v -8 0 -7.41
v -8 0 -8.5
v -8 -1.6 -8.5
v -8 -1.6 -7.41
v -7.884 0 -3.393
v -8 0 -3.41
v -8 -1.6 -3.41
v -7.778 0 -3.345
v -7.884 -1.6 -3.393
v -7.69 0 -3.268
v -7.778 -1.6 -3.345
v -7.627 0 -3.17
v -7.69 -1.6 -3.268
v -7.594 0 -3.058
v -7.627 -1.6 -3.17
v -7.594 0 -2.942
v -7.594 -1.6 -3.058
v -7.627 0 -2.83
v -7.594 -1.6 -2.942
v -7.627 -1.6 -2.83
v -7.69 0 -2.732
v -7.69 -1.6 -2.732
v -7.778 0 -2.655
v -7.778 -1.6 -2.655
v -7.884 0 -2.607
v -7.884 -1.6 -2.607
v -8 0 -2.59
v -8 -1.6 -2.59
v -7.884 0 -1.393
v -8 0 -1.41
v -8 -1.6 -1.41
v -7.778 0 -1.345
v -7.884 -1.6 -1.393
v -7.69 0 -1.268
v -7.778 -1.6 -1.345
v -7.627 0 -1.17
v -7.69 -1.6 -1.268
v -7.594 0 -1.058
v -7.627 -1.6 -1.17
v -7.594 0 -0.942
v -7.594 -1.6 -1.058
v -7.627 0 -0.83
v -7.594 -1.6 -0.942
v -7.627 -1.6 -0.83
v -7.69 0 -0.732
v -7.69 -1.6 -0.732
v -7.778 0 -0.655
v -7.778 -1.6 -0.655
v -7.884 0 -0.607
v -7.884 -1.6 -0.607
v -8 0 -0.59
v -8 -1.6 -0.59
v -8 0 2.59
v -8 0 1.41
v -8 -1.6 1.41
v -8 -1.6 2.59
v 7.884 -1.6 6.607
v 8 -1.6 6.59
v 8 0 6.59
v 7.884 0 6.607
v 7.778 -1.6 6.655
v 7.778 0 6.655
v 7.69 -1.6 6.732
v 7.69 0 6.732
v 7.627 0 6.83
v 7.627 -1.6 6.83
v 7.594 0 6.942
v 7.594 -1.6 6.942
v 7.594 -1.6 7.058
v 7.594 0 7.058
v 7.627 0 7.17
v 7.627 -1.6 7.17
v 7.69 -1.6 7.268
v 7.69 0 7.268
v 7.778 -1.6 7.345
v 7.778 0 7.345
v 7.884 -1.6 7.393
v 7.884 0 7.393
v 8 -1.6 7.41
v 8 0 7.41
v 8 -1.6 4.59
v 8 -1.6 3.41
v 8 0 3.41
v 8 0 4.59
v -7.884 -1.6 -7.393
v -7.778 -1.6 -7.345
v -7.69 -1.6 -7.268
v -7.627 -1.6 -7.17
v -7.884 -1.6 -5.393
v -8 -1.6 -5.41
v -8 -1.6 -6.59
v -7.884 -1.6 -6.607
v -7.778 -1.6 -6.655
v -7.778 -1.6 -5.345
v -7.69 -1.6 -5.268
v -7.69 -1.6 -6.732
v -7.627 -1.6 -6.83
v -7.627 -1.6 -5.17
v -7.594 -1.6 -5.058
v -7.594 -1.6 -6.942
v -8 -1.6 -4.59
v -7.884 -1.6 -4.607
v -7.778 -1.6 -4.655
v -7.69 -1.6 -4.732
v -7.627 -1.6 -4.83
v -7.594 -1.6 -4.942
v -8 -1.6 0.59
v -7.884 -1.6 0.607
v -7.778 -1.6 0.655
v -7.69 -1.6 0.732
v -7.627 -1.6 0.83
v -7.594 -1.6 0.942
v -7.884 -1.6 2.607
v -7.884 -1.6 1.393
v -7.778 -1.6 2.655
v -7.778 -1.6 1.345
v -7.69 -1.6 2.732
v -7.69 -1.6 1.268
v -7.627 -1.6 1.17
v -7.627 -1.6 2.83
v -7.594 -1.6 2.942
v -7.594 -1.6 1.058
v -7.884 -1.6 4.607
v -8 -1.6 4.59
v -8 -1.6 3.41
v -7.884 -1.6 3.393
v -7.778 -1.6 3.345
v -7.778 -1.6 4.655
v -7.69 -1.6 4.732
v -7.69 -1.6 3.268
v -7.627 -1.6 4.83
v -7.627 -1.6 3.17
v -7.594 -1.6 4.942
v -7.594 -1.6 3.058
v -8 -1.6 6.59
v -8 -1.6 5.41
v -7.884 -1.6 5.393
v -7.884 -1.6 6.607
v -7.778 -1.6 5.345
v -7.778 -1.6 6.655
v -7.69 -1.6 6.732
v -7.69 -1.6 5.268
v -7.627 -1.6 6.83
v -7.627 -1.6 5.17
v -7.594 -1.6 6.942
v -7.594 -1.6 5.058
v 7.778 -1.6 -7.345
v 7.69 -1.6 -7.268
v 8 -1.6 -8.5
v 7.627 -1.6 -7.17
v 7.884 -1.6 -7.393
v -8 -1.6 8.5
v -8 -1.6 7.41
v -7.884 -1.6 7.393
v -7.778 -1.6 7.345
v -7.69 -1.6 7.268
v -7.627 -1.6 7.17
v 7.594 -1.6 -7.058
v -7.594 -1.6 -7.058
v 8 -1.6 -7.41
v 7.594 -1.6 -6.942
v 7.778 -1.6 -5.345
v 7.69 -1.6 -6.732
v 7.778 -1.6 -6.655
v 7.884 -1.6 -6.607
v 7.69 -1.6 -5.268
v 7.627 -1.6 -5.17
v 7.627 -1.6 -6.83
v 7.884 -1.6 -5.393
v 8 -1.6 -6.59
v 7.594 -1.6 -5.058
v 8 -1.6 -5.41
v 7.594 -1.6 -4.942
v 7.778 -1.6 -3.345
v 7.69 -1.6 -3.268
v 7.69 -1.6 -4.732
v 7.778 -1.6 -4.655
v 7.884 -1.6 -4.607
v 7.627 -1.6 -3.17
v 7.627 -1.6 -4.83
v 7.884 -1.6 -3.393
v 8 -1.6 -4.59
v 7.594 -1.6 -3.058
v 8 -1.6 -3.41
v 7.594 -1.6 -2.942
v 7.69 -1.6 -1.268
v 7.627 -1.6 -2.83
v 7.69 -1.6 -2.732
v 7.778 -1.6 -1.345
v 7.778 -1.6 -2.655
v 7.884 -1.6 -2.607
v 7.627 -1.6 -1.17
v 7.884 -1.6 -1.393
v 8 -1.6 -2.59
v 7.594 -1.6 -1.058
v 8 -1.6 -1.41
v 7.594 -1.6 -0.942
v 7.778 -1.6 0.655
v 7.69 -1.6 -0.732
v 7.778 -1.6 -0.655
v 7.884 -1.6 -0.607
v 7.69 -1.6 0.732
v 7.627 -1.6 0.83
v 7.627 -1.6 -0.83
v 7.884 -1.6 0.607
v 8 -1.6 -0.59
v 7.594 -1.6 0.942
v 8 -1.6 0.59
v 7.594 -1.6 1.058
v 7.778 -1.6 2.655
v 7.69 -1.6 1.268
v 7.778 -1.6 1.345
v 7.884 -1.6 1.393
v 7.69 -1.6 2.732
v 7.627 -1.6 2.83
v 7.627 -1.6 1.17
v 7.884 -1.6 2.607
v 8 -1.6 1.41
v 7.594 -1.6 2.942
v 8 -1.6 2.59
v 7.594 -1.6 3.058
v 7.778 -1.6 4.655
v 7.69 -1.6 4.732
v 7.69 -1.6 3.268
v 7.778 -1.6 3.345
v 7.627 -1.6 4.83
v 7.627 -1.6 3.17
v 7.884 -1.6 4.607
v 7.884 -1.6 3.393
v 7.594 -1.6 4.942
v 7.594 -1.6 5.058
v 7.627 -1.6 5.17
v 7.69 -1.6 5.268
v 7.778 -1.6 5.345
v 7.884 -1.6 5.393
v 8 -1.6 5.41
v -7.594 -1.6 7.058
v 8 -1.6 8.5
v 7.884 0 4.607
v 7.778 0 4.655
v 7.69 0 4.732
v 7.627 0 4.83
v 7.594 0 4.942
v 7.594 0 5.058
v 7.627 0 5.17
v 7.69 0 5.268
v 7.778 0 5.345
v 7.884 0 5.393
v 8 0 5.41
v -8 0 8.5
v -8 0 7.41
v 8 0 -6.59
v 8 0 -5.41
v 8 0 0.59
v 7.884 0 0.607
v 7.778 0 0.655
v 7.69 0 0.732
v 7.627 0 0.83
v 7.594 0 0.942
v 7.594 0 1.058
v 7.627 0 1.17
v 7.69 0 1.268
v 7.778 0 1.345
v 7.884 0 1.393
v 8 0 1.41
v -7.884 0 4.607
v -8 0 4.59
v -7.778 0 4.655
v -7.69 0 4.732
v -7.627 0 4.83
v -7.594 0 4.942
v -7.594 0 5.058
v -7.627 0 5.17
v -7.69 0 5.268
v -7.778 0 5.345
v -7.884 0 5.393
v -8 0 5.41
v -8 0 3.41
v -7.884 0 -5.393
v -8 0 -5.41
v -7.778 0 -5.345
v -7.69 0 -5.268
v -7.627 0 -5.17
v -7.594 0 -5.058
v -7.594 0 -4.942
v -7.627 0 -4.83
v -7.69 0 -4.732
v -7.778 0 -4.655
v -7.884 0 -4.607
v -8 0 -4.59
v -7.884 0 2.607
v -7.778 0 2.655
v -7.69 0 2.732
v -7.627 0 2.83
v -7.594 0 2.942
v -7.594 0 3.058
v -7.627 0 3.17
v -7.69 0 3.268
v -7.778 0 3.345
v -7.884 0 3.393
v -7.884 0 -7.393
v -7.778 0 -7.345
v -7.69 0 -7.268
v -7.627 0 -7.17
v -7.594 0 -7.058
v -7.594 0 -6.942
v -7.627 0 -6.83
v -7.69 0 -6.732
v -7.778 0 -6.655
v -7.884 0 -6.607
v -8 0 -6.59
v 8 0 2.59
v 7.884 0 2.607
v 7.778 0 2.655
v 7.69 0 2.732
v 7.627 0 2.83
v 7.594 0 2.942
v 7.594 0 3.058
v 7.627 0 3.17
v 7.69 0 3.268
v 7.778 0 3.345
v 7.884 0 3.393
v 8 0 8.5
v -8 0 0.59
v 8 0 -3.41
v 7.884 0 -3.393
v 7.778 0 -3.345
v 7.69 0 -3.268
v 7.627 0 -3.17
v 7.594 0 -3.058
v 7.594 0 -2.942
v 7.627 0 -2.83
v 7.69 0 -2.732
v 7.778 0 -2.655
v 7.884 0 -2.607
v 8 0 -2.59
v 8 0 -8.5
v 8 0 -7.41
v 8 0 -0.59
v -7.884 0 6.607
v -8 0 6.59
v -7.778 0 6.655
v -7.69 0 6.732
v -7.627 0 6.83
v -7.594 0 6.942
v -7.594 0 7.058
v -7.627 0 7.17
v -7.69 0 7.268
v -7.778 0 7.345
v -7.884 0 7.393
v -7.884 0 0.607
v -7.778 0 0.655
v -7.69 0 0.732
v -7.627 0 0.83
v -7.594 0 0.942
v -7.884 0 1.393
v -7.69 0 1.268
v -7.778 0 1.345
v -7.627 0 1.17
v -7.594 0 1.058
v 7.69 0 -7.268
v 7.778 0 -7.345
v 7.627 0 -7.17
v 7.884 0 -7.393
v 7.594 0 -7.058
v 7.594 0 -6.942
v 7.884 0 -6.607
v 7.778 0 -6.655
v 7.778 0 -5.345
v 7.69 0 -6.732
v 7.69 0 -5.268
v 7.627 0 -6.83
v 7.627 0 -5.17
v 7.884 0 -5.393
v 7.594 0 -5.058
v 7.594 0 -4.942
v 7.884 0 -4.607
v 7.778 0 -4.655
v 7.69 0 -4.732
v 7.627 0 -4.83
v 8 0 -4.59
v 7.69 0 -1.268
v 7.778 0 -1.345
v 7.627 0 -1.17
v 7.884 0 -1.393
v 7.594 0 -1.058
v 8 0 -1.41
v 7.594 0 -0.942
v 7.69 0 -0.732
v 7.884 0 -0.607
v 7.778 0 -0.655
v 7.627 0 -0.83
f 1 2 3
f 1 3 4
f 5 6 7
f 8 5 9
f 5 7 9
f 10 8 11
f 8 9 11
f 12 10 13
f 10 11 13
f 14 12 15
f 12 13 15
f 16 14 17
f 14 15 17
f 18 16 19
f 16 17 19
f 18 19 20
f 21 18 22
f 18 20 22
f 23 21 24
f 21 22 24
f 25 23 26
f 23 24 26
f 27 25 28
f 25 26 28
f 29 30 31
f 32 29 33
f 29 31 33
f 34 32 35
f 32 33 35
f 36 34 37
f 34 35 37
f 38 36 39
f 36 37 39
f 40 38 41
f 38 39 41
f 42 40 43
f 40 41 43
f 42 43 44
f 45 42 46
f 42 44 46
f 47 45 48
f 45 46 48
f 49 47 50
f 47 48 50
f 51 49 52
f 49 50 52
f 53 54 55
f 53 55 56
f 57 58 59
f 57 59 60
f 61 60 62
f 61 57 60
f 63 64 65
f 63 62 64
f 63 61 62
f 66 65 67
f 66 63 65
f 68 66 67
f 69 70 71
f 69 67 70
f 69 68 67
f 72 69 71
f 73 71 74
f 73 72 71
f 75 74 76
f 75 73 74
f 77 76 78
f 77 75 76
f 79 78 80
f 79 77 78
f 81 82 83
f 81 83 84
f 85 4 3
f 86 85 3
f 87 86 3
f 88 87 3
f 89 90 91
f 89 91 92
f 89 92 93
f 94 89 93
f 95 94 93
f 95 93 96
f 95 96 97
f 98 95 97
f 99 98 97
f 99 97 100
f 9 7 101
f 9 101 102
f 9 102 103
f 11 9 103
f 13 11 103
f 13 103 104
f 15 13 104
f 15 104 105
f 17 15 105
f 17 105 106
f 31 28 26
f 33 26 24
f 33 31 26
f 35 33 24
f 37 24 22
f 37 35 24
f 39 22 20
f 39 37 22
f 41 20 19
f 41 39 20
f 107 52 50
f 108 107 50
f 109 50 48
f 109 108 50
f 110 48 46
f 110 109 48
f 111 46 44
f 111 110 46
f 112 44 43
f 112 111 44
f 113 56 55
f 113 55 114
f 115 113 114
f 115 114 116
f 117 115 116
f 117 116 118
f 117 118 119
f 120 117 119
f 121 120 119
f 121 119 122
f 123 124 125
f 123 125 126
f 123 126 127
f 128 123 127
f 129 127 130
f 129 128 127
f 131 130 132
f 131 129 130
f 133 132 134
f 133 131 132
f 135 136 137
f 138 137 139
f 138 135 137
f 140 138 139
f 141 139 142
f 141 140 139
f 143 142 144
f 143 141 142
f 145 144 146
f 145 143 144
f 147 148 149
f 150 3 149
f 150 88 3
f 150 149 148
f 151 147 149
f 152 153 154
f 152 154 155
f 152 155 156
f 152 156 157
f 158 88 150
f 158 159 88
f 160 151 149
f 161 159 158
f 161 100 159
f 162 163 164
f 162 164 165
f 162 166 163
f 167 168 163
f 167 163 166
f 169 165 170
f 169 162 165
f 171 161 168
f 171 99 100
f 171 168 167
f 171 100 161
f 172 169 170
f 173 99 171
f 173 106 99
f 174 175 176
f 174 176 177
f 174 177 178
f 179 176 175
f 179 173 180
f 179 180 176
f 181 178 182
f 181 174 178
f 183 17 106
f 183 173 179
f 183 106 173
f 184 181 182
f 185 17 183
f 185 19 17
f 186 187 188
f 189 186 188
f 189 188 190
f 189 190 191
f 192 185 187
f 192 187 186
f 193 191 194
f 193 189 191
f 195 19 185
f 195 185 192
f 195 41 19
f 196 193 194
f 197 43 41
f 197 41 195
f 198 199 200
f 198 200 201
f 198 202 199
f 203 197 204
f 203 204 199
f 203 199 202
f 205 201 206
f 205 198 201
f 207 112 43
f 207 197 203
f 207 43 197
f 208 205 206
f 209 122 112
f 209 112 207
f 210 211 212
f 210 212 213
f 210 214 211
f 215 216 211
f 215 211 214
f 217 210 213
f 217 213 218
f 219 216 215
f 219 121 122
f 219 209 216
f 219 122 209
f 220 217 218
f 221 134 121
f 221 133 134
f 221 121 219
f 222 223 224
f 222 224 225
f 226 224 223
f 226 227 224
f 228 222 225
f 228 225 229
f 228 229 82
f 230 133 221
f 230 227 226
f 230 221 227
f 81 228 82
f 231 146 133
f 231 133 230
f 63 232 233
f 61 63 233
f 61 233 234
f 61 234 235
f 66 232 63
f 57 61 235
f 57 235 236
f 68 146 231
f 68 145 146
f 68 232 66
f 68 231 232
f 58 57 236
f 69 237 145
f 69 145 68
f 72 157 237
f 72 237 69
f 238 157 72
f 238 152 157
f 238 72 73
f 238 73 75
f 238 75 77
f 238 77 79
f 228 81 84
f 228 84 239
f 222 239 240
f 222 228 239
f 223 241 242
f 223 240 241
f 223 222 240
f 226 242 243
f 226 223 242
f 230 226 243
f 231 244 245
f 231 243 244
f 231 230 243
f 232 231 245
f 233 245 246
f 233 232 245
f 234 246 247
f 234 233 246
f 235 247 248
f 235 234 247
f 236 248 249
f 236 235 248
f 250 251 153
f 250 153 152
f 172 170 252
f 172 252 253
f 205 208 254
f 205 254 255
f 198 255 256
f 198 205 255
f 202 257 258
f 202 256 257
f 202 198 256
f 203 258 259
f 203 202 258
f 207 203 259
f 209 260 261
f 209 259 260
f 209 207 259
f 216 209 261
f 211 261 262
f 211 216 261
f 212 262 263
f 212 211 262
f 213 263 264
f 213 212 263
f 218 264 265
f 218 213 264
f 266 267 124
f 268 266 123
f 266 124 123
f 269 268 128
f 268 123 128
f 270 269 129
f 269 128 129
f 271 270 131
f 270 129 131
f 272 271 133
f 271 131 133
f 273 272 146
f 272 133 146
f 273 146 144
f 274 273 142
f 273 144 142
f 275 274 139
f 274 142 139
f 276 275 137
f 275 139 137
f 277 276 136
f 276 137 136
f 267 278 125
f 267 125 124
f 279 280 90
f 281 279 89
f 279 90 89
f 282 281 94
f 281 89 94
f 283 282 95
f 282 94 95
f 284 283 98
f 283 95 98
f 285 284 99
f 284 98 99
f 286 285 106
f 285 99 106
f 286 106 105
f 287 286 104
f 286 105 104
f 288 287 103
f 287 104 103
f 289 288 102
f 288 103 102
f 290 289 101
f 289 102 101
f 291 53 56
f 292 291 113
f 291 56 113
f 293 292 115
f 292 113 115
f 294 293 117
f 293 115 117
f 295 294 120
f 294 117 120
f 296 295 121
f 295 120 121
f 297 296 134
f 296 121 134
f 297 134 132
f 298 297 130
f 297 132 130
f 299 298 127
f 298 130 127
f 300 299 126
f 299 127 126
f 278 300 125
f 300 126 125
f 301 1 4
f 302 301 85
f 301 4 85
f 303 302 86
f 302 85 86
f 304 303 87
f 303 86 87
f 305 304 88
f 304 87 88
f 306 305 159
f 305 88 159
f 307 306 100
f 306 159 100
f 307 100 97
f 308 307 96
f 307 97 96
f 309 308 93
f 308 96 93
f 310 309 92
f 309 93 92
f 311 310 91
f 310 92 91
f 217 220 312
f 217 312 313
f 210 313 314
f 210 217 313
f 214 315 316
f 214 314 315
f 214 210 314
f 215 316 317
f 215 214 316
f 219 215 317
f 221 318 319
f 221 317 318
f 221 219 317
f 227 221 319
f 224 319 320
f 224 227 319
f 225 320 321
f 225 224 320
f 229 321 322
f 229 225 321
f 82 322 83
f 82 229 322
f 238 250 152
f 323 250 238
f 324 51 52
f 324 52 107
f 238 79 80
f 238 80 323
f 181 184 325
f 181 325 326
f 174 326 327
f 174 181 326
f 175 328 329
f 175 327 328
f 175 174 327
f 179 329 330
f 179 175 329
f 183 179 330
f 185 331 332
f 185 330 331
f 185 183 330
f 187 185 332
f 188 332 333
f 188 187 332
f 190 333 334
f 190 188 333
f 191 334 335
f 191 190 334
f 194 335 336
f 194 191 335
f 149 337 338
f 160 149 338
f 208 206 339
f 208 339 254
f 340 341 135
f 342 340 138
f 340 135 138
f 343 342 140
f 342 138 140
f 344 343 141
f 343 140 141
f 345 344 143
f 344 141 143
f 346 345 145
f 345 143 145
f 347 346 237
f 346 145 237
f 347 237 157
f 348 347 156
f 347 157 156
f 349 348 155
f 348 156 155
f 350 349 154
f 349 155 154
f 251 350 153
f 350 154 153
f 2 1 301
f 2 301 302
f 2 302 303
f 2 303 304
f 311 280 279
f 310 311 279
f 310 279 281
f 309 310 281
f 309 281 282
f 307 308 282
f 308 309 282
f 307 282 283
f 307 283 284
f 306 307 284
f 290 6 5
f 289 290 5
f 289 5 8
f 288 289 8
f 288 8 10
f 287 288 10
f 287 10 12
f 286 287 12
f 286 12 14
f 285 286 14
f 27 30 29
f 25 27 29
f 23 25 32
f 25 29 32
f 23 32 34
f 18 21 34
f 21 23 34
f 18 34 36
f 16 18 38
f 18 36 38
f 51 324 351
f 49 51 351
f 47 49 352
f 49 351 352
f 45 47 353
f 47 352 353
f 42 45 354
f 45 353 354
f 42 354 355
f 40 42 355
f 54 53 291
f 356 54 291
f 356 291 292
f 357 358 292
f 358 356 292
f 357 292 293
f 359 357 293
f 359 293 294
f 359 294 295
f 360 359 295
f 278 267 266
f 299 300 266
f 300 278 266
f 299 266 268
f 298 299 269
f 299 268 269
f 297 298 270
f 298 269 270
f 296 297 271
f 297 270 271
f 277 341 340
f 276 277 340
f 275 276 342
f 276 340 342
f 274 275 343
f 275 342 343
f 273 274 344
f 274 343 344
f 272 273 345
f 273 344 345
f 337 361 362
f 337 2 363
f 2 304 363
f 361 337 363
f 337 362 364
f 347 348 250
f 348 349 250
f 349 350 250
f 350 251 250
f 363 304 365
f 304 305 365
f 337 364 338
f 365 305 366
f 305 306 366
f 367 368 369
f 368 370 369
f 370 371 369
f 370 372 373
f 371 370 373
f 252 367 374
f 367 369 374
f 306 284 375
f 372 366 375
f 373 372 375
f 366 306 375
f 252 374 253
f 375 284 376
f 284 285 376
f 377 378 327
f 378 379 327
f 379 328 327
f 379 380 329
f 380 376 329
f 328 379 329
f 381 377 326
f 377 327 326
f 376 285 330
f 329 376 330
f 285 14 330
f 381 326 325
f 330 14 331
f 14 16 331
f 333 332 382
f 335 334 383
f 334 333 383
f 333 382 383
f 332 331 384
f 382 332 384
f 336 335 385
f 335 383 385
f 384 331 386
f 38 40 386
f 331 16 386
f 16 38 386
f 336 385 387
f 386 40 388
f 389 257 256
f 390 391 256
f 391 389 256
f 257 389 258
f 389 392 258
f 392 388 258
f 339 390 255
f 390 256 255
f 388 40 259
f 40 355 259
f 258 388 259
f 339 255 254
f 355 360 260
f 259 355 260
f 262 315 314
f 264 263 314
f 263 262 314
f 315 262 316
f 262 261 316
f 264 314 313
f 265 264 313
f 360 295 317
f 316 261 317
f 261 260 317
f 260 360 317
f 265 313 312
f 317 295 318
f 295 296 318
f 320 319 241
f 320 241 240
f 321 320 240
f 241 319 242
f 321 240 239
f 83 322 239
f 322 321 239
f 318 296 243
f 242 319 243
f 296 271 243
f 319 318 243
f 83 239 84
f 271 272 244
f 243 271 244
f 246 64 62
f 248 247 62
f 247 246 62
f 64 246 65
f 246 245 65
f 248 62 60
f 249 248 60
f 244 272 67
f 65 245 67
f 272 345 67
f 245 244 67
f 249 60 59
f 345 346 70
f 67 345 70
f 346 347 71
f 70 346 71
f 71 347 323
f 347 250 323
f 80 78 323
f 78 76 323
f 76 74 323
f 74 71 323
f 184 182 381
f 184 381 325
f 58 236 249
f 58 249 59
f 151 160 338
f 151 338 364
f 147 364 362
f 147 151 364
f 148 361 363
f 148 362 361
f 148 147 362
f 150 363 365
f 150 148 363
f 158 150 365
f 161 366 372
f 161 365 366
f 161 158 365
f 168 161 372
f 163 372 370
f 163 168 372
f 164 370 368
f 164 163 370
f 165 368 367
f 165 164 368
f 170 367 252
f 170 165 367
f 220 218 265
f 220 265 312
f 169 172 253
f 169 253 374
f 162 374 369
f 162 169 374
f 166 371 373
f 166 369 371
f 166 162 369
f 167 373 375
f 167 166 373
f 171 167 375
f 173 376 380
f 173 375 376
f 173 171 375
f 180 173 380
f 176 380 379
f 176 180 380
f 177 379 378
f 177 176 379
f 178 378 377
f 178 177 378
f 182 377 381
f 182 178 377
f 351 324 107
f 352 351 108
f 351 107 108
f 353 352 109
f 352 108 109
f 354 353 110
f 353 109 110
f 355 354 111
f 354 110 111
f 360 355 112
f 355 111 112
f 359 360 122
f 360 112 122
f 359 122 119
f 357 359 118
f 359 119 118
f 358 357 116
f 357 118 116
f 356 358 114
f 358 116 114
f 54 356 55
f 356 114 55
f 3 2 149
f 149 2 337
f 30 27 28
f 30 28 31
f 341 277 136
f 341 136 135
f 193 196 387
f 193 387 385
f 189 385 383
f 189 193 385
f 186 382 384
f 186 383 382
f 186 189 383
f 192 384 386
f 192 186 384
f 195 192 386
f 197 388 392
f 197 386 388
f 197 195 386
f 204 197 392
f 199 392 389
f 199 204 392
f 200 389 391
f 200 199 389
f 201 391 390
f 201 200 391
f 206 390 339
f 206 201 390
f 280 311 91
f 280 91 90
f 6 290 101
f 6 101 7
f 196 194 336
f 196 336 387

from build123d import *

# Parameters (mm, degrees)
SKETCH_W                          = 16
SKETCH_H                          = 17
PAD_DEPTH                         = 1.6
SKETCH002_R                       = 0.41
POCKET_DEPTH                      = 48.401
POCKET_DEPTH_BACK                 = 46.801
SKETCH002_LINEARPATTERN_2_R       = 0.41
POCKET_LINEARPATTERN_2_DEPTH      = 48.401
POCKET_LINEARPATTERN_2_DEPTH_BACK = 46.801
SKETCH002_LINEARPATTERN_3_R       = 0.41
POCKET_LINEARPATTERN_3_DEPTH      = 48.401
POCKET_LINEARPATTERN_3_DEPTH_BACK = 46.801
SKETCH002_LINEARPATTERN_4_R       = 0.41
POCKET_LINEARPATTERN_4_DEPTH      = 48.401
POCKET_LINEARPATTERN_4_DEPTH_BACK = 46.801
SKETCH002_LINEARPATTERN_5_R       = 0.41
POCKET_LINEARPATTERN_5_DEPTH      = 48.401
POCKET_LINEARPATTERN_5_DEPTH_BACK = 46.801
SKETCH002_LINEARPATTERN_6_R       = 0.41
POCKET_LINEARPATTERN_6_DEPTH      = 48.401
POCKET_LINEARPATTERN_6_DEPTH_BACK = 46.801
SKETCH002_LINEARPATTERN_7_R       = 0.41
POCKET_LINEARPATTERN_7_DEPTH      = 48.401
POCKET_LINEARPATTERN_7_DEPTH_BACK = 46.801
SKETCH002_LINEARPATTERN_8_R       = 0.41
POCKET_LINEARPATTERN_8_DEPTH      = 48.401
POCKET_LINEARPATTERN_8_DEPTH_BACK = 46.801


with BuildPart() as part:
    # Sketch → Pad (new body)
    with BuildSketch(Plane.XZ):
        Rectangle(SKETCH_W, SKETCH_H)
    extrude(amount=PAD_DEPTH)

    # Sketch002 → Pocket (cut, two sides)
    with BuildSketch(Plane.XZ.offset(1.6)) as pocket_sk:
        with Locations((-8, 7)):
            Circle(SKETCH002_R)
    pocket = extrude(amount=-POCKET_DEPTH, mode=Mode.SUBTRACT) + extrude(pocket_sk.sketch, amount=POCKET_DEPTH_BACK, mode=Mode.SUBTRACT)

    # Sketch002 LinearPattern 2 → Pocket LinearPattern 2 (cut, two sides)
    with BuildSketch(Plane(origin=(0, -1.6, -2), x_dir=(1, 0, 0), z_dir=(0, -1, 0))) as pocket_linearpattern_2_sk:
        with Locations((-8, 7)):
            Circle(SKETCH002_LINEARPATTERN_2_R)
    pocket_linearpattern_2 = extrude(amount=-POCKET_LINEARPATTERN_2_DEPTH, mode=Mode.SUBTRACT) + extrude(pocket_linearpattern_2_sk.sketch, amount=POCKET_LINEARPATTERN_2_DEPTH_BACK, mode=Mode.SUBTRACT)

    # Sketch002 LinearPattern 3 → Pocket LinearPattern 3 (cut, two sides)
    with BuildSketch(Plane(origin=(0, -1.6, -4), x_dir=(1, 0, 0), z_dir=(0, -1, 0))) as pocket_linearpattern_3_sk:
        with Locations((-8, 7)):
            Circle(SKETCH002_LINEARPATTERN_3_R)
    pocket_linearpattern_3 = extrude(amount=-POCKET_LINEARPATTERN_3_DEPTH, mode=Mode.SUBTRACT) + extrude(pocket_linearpattern_3_sk.sketch, amount=POCKET_LINEARPATTERN_3_DEPTH_BACK, mode=Mode.SUBTRACT)

    # Sketch002 LinearPattern 4 → Pocket LinearPattern 4 (cut, two sides)
    with BuildSketch(Plane(origin=(0, -1.6, -6), x_dir=(1, 0, 0), z_dir=(0, -1, 0))) as pocket_linearpattern_4_sk:
        with Locations((-8, 7)):
            Circle(SKETCH002_LINEARPATTERN_4_R)
    pocket_linearpattern_4 = extrude(amount=-POCKET_LINEARPATTERN_4_DEPTH, mode=Mode.SUBTRACT) + extrude(pocket_linearpattern_4_sk.sketch, amount=POCKET_LINEARPATTERN_4_DEPTH_BACK, mode=Mode.SUBTRACT)

    # Sketch002 LinearPattern 5 → Pocket LinearPattern 5 (cut, two sides)
    with BuildSketch(Plane(origin=(0, -1.6, -8), x_dir=(1, 0, 0), z_dir=(0, -1, 0))) as pocket_linearpattern_5_sk:
        with Locations((-8, 7)):
            Circle(SKETCH002_LINEARPATTERN_5_R)
    pocket_linearpattern_5 = extrude(amount=-POCKET_LINEARPATTERN_5_DEPTH, mode=Mode.SUBTRACT) + extrude(pocket_linearpattern_5_sk.sketch, amount=POCKET_LINEARPATTERN_5_DEPTH_BACK, mode=Mode.SUBTRACT)

    # Sketch002 LinearPattern 6 → Pocket LinearPattern 6 (cut, two sides)
    with BuildSketch(Plane(origin=(0, -1.6, -10), x_dir=(1, 0, 0), z_dir=(0, -1, 0))) as pocket_linearpattern_6_sk:
        with Locations((-8, 7)):
            Circle(SKETCH002_LINEARPATTERN_6_R)
    pocket_linearpattern_6 = extrude(amount=-POCKET_LINEARPATTERN_6_DEPTH, mode=Mode.SUBTRACT) + extrude(pocket_linearpattern_6_sk.sketch, amount=POCKET_LINEARPATTERN_6_DEPTH_BACK, mode=Mode.SUBTRACT)

    # Sketch002 LinearPattern 7 → Pocket LinearPattern 7 (cut, two sides)
    with BuildSketch(Plane(origin=(0, -1.6, -12), x_dir=(1, 0, 0), z_dir=(0, -1, 0))) as pocket_linearpattern_7_sk:
        with Locations((-8, 7)):
            Circle(SKETCH002_LINEARPATTERN_7_R)
    pocket_linearpattern_7 = extrude(amount=-POCKET_LINEARPATTERN_7_DEPTH, mode=Mode.SUBTRACT) + extrude(pocket_linearpattern_7_sk.sketch, amount=POCKET_LINEARPATTERN_7_DEPTH_BACK, mode=Mode.SUBTRACT)

    # Sketch002 LinearPattern 8 → Pocket LinearPattern 8 (cut, two sides)
    with BuildSketch(Plane(origin=(0, -1.6, -14), x_dir=(1, 0, 0), z_dir=(0, -1, 0))) as pocket_linearpattern_8_sk:
        with Locations((-8, 7)):
            Circle(SKETCH002_LINEARPATTERN_8_R)
    pocket_linearpattern_8 = extrude(amount=-POCKET_LINEARPATTERN_8_DEPTH, mode=Mode.SUBTRACT) + extrude(pocket_linearpattern_8_sk.sketch, amount=POCKET_LINEARPATTERN_8_DEPTH_BACK, mode=Mode.SUBTRACT)

    # Mirrored: Pocket, Pocket LinearPattern 2, Pocket LinearPattern 3, Pocket LinearPattern 4, Pocket LinearPattern 5, Pocket LinearPattern 6, Pocket LinearPattern 7, Pocket LinearPattern 8 across YZ
    add(pocket.mirror(Plane.YZ), mode=Mode.SUBTRACT)
    add(pocket_linearpattern_2.mirror(Plane.YZ), mode=Mode.SUBTRACT)
    add(pocket_linearpattern_3.mirror(Plane.YZ), mode=Mode.SUBTRACT)
    add(pocket_linearpattern_4.mirror(Plane.YZ), mode=Mode.SUBTRACT)
    add(pocket_linearpattern_5.mirror(Plane.YZ), mode=Mode.SUBTRACT)
    add(pocket_linearpattern_6.mirror(Plane.YZ), mode=Mode.SUBTRACT)
    add(pocket_linearpattern_7.mirror(Plane.YZ), mode=Mode.SUBTRACT)
    add(pocket_linearpattern_8.mirror(Plane.YZ), mode=Mode.SUBTRACT)


solid = part.part
